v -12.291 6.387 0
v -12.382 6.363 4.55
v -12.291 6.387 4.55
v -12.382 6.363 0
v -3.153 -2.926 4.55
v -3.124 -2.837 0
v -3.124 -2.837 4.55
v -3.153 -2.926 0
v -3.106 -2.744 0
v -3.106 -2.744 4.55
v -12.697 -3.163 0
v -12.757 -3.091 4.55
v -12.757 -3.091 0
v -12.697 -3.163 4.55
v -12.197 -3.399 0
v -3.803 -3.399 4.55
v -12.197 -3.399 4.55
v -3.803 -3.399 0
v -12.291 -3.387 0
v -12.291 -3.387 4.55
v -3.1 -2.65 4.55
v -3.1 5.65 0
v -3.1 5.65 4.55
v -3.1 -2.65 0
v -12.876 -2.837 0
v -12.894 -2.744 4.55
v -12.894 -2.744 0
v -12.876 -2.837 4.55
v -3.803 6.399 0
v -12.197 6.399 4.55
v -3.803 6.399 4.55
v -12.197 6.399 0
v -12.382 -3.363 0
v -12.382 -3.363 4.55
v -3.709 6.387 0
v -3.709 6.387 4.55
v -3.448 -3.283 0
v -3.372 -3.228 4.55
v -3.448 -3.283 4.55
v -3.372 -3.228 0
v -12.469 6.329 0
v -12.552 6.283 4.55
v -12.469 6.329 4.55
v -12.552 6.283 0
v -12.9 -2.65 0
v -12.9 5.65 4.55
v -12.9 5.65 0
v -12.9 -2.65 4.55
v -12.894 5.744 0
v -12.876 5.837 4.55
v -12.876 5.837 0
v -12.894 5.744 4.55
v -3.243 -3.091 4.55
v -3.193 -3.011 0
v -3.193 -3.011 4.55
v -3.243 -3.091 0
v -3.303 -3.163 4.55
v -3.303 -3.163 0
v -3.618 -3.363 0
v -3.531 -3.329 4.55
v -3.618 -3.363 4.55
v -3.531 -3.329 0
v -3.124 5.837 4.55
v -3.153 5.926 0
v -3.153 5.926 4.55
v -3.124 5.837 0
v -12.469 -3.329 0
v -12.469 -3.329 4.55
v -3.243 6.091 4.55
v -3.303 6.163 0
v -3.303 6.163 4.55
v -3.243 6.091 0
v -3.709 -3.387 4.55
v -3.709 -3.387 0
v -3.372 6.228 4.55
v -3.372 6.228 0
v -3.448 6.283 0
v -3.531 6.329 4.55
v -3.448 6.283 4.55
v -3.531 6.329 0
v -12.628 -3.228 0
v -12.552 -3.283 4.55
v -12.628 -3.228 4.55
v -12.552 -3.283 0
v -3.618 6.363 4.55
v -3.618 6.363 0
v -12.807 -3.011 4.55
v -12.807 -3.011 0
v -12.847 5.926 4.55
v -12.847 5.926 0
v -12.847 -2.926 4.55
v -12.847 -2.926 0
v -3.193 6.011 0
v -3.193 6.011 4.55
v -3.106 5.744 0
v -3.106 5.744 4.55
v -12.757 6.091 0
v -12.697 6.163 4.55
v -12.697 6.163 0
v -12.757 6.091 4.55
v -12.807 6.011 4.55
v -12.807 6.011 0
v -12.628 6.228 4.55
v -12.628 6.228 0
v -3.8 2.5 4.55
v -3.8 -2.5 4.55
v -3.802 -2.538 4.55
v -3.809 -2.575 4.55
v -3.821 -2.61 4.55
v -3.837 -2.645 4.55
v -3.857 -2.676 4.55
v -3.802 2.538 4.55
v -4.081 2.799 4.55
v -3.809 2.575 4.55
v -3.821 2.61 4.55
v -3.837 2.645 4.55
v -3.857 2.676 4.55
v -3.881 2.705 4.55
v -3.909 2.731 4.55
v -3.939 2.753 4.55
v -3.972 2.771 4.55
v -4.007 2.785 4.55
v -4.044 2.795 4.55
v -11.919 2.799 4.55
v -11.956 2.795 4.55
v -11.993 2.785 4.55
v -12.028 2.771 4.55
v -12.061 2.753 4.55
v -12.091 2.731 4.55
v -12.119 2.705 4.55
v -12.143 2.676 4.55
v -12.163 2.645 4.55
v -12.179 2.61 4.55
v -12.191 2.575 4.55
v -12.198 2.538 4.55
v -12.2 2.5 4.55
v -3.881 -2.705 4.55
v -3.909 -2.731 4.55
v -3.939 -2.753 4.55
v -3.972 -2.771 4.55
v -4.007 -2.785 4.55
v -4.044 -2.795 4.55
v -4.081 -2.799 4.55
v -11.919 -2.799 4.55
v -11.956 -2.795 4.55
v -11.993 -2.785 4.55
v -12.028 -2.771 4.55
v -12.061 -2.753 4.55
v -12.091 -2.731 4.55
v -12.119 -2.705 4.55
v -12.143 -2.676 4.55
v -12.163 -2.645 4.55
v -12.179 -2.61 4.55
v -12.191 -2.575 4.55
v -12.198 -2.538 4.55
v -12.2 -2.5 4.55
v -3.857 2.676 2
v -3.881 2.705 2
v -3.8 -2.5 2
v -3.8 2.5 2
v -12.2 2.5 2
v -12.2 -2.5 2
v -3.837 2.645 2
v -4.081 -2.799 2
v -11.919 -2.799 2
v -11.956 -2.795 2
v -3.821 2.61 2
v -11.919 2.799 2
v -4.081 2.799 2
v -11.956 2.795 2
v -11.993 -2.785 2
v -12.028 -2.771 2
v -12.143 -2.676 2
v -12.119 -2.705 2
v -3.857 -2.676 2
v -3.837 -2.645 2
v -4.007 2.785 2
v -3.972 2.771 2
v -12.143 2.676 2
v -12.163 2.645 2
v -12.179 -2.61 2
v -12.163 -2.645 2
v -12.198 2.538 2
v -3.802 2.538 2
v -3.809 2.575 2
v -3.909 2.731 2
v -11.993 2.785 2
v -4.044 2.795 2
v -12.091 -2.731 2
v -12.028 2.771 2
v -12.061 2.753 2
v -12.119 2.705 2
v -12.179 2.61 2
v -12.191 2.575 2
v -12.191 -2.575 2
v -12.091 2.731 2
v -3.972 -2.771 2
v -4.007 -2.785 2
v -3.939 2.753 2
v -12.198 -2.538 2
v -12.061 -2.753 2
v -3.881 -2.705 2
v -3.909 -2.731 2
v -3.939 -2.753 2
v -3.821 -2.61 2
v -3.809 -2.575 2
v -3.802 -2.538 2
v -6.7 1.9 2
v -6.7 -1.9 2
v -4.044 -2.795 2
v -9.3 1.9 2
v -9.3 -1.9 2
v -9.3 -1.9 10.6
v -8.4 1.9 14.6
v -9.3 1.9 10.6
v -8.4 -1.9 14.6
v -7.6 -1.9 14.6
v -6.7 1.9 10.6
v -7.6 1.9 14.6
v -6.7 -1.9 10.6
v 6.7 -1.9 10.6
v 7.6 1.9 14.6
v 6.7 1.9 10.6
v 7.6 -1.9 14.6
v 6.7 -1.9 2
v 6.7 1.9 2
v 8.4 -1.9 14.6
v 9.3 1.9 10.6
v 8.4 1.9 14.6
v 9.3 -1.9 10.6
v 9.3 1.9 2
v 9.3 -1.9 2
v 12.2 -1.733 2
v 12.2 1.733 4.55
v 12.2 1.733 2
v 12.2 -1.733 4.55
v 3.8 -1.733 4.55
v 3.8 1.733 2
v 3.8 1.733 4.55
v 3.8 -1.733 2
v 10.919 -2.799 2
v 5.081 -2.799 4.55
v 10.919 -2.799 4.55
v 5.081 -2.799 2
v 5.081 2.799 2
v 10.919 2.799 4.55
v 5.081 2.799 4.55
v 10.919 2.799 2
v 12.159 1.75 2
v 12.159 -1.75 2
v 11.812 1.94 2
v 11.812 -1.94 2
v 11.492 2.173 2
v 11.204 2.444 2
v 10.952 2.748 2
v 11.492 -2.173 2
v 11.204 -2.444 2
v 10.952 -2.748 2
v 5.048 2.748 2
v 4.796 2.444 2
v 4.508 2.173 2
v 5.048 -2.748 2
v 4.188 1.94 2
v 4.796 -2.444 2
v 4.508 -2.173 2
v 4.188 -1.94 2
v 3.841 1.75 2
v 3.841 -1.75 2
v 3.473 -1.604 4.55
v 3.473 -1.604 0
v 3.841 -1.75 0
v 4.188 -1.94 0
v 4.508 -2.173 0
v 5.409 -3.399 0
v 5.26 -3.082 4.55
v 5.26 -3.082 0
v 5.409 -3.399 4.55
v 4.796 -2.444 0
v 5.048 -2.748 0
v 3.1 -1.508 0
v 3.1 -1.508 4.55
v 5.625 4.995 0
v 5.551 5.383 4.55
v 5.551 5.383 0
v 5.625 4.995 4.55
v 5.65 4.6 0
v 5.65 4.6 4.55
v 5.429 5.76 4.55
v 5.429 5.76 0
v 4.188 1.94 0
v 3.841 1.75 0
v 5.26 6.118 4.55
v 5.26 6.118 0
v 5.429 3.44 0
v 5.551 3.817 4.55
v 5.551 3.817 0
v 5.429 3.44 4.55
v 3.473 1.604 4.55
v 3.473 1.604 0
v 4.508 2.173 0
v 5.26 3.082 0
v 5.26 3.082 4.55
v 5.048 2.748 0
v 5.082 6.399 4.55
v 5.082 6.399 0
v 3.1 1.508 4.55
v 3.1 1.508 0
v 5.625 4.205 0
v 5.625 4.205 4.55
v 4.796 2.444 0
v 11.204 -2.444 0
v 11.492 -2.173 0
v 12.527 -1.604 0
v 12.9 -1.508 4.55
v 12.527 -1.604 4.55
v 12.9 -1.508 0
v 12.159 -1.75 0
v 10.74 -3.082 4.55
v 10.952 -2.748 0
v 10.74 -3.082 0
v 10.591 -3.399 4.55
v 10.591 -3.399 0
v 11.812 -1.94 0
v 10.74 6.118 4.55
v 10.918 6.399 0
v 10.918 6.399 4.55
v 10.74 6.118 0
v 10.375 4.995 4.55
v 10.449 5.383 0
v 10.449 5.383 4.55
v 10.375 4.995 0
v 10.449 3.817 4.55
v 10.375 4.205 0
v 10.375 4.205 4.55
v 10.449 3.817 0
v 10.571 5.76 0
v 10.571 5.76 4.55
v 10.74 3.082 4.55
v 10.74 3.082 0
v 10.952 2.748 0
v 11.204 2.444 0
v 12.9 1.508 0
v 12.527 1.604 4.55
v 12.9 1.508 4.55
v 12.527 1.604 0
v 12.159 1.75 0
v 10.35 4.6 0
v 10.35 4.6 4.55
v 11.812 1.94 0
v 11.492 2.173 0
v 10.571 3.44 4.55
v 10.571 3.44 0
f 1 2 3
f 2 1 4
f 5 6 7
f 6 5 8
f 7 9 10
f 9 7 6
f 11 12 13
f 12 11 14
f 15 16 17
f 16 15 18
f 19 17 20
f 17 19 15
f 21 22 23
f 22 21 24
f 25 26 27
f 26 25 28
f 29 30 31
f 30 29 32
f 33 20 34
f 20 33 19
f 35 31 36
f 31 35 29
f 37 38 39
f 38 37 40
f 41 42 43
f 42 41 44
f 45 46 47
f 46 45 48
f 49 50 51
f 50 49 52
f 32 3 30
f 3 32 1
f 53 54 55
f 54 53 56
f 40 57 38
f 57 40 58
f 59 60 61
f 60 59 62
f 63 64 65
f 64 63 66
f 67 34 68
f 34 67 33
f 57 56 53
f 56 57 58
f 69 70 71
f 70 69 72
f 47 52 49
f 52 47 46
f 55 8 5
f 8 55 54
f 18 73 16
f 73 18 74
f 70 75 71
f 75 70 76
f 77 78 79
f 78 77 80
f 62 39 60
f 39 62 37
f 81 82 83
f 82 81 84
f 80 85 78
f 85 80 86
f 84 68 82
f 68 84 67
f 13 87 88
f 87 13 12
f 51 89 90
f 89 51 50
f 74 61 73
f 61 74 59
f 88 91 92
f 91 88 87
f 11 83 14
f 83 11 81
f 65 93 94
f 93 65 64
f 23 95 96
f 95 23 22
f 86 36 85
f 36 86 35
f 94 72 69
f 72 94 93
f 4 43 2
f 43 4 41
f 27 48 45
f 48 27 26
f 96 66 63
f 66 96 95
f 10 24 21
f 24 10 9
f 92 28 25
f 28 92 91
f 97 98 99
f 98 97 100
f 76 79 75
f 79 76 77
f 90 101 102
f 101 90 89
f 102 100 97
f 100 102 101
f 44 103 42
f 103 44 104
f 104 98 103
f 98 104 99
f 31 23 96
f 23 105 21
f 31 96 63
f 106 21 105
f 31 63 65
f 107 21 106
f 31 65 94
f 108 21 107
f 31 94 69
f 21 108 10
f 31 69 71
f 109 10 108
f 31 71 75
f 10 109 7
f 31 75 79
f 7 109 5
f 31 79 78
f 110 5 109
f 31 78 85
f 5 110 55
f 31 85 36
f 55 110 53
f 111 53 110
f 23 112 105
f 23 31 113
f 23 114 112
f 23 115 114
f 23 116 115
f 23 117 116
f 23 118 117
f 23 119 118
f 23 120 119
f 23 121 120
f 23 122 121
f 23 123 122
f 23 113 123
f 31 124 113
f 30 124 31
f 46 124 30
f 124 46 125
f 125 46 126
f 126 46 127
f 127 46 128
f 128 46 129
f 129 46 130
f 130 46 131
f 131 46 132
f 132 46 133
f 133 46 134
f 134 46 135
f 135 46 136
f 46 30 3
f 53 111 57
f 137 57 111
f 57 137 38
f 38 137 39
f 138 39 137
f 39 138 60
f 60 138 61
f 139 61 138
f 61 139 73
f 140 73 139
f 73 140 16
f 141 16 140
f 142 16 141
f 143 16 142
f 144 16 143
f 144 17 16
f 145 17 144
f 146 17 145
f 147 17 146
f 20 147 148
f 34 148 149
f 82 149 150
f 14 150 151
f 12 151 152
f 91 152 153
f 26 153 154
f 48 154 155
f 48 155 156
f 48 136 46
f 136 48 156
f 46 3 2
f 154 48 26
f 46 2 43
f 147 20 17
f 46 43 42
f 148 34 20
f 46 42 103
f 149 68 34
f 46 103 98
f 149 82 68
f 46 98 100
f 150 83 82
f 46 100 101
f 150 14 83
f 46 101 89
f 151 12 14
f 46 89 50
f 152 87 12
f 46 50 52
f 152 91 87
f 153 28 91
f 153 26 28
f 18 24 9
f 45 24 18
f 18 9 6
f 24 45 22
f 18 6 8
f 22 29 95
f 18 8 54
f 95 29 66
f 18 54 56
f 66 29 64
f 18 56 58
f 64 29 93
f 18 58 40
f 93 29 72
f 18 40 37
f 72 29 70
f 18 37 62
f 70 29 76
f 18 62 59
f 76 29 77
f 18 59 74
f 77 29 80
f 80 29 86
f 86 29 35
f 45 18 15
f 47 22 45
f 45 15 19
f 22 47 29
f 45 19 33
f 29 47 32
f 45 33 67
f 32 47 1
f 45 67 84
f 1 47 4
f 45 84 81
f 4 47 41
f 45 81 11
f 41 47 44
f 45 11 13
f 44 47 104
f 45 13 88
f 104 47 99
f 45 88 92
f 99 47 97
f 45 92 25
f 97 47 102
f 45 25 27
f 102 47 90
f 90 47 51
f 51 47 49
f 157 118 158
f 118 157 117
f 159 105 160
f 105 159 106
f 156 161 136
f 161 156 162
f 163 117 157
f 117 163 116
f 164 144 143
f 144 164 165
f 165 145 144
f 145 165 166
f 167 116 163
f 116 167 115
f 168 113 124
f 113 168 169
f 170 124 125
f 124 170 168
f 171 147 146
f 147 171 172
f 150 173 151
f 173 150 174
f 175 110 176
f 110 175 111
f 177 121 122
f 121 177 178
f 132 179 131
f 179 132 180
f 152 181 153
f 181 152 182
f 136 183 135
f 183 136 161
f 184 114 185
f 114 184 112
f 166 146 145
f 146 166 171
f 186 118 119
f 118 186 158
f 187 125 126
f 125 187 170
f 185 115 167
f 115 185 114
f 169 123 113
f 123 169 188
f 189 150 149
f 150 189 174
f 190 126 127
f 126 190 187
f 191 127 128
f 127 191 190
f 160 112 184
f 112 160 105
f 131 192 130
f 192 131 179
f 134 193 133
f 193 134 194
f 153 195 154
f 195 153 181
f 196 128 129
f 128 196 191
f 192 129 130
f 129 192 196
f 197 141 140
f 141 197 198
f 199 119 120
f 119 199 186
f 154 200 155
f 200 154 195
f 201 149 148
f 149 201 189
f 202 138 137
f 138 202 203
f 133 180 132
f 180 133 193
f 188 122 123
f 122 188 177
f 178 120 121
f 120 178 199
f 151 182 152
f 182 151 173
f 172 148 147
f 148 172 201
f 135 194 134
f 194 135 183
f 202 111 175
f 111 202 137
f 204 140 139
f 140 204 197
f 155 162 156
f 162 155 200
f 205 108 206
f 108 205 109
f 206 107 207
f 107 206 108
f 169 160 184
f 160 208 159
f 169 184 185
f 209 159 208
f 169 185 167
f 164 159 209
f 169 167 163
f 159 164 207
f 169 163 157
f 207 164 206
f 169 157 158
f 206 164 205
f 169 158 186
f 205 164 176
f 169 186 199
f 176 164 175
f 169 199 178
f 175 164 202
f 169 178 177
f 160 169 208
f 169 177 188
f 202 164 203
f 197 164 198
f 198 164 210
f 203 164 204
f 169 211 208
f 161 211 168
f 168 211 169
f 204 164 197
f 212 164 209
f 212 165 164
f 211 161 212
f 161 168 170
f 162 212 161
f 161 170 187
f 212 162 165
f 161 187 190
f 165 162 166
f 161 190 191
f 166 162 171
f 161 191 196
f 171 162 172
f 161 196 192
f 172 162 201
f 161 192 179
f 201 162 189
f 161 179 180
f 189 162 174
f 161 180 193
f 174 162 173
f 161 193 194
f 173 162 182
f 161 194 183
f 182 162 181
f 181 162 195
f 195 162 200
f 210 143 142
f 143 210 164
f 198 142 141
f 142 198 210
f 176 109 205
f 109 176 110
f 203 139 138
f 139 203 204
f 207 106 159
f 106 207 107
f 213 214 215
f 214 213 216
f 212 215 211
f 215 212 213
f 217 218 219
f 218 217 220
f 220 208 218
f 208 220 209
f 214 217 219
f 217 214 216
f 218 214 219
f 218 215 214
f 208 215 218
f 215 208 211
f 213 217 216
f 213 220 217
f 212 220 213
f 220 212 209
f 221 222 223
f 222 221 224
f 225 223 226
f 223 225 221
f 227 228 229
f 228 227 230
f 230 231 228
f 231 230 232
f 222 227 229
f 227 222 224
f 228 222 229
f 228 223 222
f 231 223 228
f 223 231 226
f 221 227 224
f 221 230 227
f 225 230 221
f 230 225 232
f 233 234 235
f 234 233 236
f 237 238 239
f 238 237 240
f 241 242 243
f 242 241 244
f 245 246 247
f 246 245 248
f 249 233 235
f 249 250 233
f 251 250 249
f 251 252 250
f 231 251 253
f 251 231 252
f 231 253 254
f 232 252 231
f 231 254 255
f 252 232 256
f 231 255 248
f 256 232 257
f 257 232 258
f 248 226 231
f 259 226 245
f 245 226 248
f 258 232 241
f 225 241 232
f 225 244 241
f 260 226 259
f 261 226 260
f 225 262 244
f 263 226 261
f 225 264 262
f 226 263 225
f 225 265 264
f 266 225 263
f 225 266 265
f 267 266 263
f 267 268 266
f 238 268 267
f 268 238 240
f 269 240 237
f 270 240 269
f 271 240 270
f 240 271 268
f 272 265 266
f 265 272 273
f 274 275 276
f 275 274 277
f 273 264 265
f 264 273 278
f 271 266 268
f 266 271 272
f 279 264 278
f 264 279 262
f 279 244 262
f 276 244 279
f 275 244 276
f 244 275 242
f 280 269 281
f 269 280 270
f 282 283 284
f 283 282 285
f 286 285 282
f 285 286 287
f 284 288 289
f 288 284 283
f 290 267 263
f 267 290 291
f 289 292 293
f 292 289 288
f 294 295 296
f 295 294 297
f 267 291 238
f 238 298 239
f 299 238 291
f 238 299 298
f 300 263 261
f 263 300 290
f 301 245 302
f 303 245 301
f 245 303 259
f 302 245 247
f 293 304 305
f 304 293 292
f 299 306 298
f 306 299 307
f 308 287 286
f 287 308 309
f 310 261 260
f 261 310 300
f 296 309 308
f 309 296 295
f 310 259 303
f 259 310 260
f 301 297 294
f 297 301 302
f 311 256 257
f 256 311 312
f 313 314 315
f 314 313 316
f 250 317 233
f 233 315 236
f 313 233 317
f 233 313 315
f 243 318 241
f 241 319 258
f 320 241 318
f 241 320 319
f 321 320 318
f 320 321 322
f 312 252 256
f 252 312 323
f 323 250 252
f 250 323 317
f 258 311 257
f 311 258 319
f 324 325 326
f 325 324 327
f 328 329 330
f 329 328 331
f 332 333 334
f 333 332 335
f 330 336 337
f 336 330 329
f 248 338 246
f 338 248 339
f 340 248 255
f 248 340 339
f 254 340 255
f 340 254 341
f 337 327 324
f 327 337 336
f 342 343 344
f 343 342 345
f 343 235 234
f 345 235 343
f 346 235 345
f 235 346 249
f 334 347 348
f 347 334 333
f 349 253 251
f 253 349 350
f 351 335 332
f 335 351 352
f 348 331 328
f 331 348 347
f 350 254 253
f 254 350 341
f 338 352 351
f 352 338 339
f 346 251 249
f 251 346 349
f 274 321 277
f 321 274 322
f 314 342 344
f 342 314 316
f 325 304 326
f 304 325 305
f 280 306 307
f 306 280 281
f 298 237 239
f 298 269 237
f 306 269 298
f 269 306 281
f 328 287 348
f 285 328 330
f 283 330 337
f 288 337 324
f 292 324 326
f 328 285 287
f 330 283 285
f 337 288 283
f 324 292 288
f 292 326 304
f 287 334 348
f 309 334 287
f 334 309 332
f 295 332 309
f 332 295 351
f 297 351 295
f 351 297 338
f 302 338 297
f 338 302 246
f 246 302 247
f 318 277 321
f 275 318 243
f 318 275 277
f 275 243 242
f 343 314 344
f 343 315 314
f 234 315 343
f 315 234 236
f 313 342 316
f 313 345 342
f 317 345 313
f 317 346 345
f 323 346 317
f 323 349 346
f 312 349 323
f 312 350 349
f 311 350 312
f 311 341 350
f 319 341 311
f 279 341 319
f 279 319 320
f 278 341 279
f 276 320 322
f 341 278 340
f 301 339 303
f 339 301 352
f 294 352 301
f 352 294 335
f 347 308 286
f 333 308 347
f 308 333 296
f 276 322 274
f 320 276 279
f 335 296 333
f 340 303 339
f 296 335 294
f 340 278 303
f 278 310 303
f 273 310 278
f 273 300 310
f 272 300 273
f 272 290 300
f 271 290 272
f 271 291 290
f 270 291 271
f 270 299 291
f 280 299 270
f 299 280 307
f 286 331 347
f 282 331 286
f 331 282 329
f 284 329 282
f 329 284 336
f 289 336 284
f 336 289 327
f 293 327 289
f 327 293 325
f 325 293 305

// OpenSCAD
translate([-8,0,0]) { 
// Archived geometry from ../../parts/oobb_organization_storage_drawer_unit_rectangle_100_ml_tamper_evident_systempak_209_container_4_column_12_row_ai_version_7_style_double_sided_plywood_395_max/front_plug_square.scad
$fn = 50;

difference() {
	union() {
		translate(v = [0, 0, 0]) {
			rotate(a = [0, 0, 0]) {
				difference() {
					union() {
						translate(v = [0, 0, 0]) {
							rotate(a = [0, 0, 0]) {
								difference() {
									union() {
										translate(v = [0, 0, 0]) {
											rotate(a = [0, 0, 0]) {
												difference() {
													union() {
														translate(v = [0, 1.5, 0]) {
															hull() {
																translate(v = [-4.15, 4.15, 0]) {
																	cylinder(h = 4.55, r = 0.75);
																}
																translate(v = [4.15, 4.15, 0]) {
																	cylinder(h = 4.55, r = 0.75);
																}
																translate(v = [-4.15, -4.15, 0]) {
																	cylinder(h = 4.55, r = 0.75);
																}
																translate(v = [4.15, -4.15, 0]) {
																	cylinder(h = 4.55, r = 0.75);
																}
															}
														}
													}
													union() {
														translate(v = [0, 0, 2.0]) {
															hull() {
																translate(v = [-3.9000000000000004, 2.5, 0]) {
																	cylinder(h = 2.65, r = 0.3);
																}
																translate(v = [3.9000000000000004, 2.5, 0]) {
																	cylinder(h = 2.65, r = 0.3);
																}
																translate(v = [-3.9000000000000004, -2.5, 0]) {
																	cylinder(h = 2.65, r = 0.3);
																}
																translate(v = [3.9000000000000004, -2.5, 0]) {
																	cylinder(h = 2.65, r = 0.3);
																}
															}
														}
													}
												}
											}
										}
										translate(v = [0, 0, 0]) {
											rotate(a = [0, 0, 0]) {
												difference() {
													union() {
														translate(v = [-1.4000000000000001, -1.9, 1.95]) {
															cube(size = [2.8000000000000003, 3.8, 12.65]);
														}
													}
													union() {
														translate(v = [0, 2.0, 0]) {
															rotate(a = [90, 0, 0]) {
																linear_extrude(height = 4.0) {
																	polygon(points = [[-1.3, 1.85], [-1.3, 10.6], [-0.4, 14.6], [-0.4, 14.799999999999999], [-1.6, 14.799999999999999], [-1.6, 1.85]]);
																}
															}
														}
														translate(v = [0, 2.0, 0]) {
															rotate(a = [90, 0, 0]) {
																linear_extrude(height = 4.0) {
																	polygon(points = [[1.3, 1.85], [1.3, 10.6], [0.4, 14.6], [0.4, 14.799999999999999], [1.6, 14.799999999999999], [1.6, 1.85]]);
																}
															}
														}
													}
												}
											}
										}
									}
									union();
								}
							}
						}
					}
					union();
				}
			}
		}
	}
	union();
}
 }
translate([8,0,0]) { 
// Archived geometry from ../../parts/oobb_organization_storage_drawer_unit_rectangle_100_ml_tamper_evident_systempak_209_container_4_column_12_row_ai_version_7_style_double_sided_plywood_395_max/front_plug.scad
$fn = 50;

difference() {
	union() {
		translate(v = [0, 0, 0]) {
			rotate(a = [0, 0, 0]) {
				difference() {
					union() {
						translate(v = [0, 0, 0]) {
							rotate(a = [0, 0, 0]) {
								difference() {
									union() {
										translate(v = [0, 0, 0]) {
											rotate(a = [0, 0, 0]) {
												difference() {
													union() {
														translate(v = [0, 1.5, 0]) {
															hull() {
																translate(v = [-4.15, 4.15, 0]) {
																	cylinder(h = 4.55, r = 0.75);
																}
																translate(v = [4.15, 4.15, 0]) {
																	cylinder(h = 4.55, r = 0.75);
																}
																translate(v = [-4.15, -4.15, 0]) {
																	cylinder(h = 4.55, r = 0.75);
																}
																translate(v = [4.15, -4.15, 0]) {
																	cylinder(h = 4.55, r = 0.75);
																}
															}
														}
													}
													union() {
														translate(v = [0, 0, 2.0]) {
															hull() {
																translate(v = [-3.9000000000000004, 2.5, 0]) {
																	cylinder(h = 2.65, r = 0.3);
																}
																translate(v = [3.9000000000000004, 2.5, 0]) {
																	cylinder(h = 2.65, r = 0.3);
																}
																translate(v = [-3.9000000000000004, -2.5, 0]) {
																	cylinder(h = 2.65, r = 0.3);
																}
																translate(v = [3.9000000000000004, -2.5, 0]) {
																	cylinder(h = 2.65, r = 0.3);
																}
															}
														}
														translate(v = [-5.5, -4.6, -0.1]) {
															cylinder(h = 4.75, r = 3.15);
														}
														translate(v = [-5.5, 4.6, -0.1]) {
															cylinder(h = 4.75, r = 3.15);
														}
														translate(v = [5.5, -4.6, -0.1]) {
															cylinder(h = 4.75, r = 3.15);
														}
														translate(v = [5.5, 4.6, -0.1]) {
															cylinder(h = 4.75, r = 3.15);
														}
													}
												}
											}
										}
										translate(v = [0, 0, 0]) {
											rotate(a = [0, 0, 0]) {
												difference() {
													union() {
														translate(v = [-1.4000000000000001, -1.9, 1.95]) {
															cube(size = [2.8000000000000003, 3.8, 12.65]);
														}
													}
													union() {
														translate(v = [0, 2.0, 0]) {
															rotate(a = [90, 0, 0]) {
																linear_extrude(height = 4.0) {
																	polygon(points = [[-1.3, 1.85], [-1.3, 10.6], [-0.4, 14.6], [-0.4, 14.799999999999999], [-1.6, 14.799999999999999], [-1.6, 1.85]]);
																}
															}
														}
														translate(v = [0, 2.0, 0]) {
															rotate(a = [90, 0, 0]) {
																linear_extrude(height = 4.0) {
																	polygon(points = [[1.3, 1.85], [1.3, 10.6], [0.4, 14.6], [0.4, 14.799999999999999], [1.6, 14.799999999999999], [1.6, 1.85]]);
																}
															}
														}
													}
												}
											}
										}
									}
									union();
								}
							}
						}
					}
					union();
				}
			}
		}
	}
	union();
}
 }
